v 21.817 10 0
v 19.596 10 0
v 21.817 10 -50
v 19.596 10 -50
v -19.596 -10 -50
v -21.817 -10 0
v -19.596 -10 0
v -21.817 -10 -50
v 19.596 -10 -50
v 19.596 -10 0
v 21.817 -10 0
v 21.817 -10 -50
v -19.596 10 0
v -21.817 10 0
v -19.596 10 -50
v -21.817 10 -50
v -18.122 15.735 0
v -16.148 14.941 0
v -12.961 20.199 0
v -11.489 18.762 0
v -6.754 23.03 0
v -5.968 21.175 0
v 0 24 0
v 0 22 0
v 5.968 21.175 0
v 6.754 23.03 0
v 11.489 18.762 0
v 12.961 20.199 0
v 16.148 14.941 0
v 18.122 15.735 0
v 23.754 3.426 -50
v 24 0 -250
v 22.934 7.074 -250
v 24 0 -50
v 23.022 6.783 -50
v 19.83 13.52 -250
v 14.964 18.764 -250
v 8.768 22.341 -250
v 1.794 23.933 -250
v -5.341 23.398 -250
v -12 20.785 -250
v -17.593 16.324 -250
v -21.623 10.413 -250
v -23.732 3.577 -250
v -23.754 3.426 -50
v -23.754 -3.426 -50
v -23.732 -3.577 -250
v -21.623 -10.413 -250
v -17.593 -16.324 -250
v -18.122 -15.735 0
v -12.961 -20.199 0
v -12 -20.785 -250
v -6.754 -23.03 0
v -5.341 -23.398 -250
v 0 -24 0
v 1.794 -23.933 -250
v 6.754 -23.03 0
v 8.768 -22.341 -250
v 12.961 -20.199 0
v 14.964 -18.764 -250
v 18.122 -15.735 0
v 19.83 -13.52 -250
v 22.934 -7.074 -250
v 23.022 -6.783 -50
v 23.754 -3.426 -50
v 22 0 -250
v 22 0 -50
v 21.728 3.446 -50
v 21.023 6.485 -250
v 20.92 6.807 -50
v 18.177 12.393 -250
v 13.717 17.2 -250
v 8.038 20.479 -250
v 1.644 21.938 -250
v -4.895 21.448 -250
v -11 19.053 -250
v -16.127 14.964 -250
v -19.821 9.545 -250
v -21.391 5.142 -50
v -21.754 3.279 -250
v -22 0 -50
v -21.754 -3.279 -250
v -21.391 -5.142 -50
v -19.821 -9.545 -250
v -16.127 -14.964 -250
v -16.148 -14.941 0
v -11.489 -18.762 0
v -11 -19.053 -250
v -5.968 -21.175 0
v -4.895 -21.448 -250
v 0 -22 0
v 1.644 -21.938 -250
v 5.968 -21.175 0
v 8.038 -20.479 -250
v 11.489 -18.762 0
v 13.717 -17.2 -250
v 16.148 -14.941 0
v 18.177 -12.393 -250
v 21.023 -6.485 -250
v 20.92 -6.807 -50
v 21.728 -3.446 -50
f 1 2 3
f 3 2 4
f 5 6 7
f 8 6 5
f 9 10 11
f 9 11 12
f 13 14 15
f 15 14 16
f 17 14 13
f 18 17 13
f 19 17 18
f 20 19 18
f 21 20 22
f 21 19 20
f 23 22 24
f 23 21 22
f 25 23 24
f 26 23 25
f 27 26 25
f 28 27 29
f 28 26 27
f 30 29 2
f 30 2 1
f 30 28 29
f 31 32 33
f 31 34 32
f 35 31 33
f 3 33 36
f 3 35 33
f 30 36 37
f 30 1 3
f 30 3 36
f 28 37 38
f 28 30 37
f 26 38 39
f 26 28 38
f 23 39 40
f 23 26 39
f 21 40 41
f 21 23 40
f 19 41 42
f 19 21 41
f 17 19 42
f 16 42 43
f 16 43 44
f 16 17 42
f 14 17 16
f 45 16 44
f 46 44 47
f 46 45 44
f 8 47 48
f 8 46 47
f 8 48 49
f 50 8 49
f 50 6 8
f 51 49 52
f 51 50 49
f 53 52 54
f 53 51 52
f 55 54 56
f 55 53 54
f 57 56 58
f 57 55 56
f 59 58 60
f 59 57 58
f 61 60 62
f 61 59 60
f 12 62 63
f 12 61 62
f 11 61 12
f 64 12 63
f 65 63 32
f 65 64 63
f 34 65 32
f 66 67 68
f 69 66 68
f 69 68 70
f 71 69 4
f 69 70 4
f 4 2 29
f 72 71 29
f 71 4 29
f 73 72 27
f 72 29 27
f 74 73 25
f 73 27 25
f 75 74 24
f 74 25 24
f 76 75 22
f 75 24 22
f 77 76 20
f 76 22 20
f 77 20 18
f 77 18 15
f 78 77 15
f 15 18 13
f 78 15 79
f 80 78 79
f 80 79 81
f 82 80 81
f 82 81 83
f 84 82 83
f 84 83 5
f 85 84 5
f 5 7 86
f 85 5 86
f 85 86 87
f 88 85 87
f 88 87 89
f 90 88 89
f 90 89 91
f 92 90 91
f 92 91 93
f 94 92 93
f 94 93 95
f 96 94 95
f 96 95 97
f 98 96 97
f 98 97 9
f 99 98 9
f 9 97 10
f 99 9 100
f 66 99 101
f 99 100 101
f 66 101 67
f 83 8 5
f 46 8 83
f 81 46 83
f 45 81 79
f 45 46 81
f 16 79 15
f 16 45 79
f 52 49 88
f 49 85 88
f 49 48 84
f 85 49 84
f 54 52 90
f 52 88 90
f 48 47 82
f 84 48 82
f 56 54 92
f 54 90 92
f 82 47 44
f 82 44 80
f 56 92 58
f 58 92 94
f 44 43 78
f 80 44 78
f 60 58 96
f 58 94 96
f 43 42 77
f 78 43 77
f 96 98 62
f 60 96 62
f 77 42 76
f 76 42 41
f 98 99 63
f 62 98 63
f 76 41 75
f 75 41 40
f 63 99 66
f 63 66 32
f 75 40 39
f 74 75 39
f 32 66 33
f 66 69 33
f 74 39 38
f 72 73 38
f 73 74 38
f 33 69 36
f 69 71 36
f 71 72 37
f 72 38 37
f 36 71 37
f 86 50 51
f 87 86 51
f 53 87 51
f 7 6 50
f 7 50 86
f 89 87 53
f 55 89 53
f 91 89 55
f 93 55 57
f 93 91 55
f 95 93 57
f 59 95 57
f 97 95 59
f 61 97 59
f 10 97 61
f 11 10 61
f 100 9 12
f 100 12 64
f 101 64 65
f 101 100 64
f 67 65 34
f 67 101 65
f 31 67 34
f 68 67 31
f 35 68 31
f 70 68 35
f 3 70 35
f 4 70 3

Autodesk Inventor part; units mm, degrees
ref_plane "YZ Plane" through (0, 0, 0) normal (1, 0, 0) x (0, 1, 0)
ref_plane "XZ Plane" through (0, 0, 0) normal (0, 1, 0) x (-1, 0, 0)
ref_plane "XY Plane" through (0, 0, 0) normal (0, 0, 1) x (1, 0, 0)
sketch "Boceto1" plane through (0, 0, 0) normal (0, 0, 1) x (1, 0, 0)
  circle A0 centre (0, 0) radius 24
  dimension "d0" = 48
extrude "Extrusión1" add sketch "Boceto1" against normal blind 250
shell "Vaciado1" thickness 2 removed faces 2 at (5.9881, 2.1306, 0) at (5.9881, 2.1306, -250)
sketch "Boceto2" plane through (0, 0, 0) normal (1, 0, 0) x (0, 1, 0)
  line L0 (-24, -250) -> (24, -250) projected
  line L1 (-24, 0) -> (24, 0) projected
  line L2 (-24, 0) -> (24, 0) projected
  line L3 (0, 0) -> (10, 0)
  line L4 (10, 0) -> (10, -50)
  line L5 (10, -50) -> (0, -50)
  line L6 (0, -50) -> (0, 0)
  line L7 (0, 0) -> (-10, 0)
  line L8 (-10, 0) -> (-10, -50)
  line L9 (-10, -50) -> (0, -50)
  line L10 (0, -50) -> (0, 0)
  dimension "d4" = 10
  dimension "d5" = 50
  dimension "d6" = 10
  dimension "d7" = 50
extrude "Extrusión2" cut sketch "Boceto2" along normal mid plane 60
properties part number "Cañón" material "Tuberías de PVC"
